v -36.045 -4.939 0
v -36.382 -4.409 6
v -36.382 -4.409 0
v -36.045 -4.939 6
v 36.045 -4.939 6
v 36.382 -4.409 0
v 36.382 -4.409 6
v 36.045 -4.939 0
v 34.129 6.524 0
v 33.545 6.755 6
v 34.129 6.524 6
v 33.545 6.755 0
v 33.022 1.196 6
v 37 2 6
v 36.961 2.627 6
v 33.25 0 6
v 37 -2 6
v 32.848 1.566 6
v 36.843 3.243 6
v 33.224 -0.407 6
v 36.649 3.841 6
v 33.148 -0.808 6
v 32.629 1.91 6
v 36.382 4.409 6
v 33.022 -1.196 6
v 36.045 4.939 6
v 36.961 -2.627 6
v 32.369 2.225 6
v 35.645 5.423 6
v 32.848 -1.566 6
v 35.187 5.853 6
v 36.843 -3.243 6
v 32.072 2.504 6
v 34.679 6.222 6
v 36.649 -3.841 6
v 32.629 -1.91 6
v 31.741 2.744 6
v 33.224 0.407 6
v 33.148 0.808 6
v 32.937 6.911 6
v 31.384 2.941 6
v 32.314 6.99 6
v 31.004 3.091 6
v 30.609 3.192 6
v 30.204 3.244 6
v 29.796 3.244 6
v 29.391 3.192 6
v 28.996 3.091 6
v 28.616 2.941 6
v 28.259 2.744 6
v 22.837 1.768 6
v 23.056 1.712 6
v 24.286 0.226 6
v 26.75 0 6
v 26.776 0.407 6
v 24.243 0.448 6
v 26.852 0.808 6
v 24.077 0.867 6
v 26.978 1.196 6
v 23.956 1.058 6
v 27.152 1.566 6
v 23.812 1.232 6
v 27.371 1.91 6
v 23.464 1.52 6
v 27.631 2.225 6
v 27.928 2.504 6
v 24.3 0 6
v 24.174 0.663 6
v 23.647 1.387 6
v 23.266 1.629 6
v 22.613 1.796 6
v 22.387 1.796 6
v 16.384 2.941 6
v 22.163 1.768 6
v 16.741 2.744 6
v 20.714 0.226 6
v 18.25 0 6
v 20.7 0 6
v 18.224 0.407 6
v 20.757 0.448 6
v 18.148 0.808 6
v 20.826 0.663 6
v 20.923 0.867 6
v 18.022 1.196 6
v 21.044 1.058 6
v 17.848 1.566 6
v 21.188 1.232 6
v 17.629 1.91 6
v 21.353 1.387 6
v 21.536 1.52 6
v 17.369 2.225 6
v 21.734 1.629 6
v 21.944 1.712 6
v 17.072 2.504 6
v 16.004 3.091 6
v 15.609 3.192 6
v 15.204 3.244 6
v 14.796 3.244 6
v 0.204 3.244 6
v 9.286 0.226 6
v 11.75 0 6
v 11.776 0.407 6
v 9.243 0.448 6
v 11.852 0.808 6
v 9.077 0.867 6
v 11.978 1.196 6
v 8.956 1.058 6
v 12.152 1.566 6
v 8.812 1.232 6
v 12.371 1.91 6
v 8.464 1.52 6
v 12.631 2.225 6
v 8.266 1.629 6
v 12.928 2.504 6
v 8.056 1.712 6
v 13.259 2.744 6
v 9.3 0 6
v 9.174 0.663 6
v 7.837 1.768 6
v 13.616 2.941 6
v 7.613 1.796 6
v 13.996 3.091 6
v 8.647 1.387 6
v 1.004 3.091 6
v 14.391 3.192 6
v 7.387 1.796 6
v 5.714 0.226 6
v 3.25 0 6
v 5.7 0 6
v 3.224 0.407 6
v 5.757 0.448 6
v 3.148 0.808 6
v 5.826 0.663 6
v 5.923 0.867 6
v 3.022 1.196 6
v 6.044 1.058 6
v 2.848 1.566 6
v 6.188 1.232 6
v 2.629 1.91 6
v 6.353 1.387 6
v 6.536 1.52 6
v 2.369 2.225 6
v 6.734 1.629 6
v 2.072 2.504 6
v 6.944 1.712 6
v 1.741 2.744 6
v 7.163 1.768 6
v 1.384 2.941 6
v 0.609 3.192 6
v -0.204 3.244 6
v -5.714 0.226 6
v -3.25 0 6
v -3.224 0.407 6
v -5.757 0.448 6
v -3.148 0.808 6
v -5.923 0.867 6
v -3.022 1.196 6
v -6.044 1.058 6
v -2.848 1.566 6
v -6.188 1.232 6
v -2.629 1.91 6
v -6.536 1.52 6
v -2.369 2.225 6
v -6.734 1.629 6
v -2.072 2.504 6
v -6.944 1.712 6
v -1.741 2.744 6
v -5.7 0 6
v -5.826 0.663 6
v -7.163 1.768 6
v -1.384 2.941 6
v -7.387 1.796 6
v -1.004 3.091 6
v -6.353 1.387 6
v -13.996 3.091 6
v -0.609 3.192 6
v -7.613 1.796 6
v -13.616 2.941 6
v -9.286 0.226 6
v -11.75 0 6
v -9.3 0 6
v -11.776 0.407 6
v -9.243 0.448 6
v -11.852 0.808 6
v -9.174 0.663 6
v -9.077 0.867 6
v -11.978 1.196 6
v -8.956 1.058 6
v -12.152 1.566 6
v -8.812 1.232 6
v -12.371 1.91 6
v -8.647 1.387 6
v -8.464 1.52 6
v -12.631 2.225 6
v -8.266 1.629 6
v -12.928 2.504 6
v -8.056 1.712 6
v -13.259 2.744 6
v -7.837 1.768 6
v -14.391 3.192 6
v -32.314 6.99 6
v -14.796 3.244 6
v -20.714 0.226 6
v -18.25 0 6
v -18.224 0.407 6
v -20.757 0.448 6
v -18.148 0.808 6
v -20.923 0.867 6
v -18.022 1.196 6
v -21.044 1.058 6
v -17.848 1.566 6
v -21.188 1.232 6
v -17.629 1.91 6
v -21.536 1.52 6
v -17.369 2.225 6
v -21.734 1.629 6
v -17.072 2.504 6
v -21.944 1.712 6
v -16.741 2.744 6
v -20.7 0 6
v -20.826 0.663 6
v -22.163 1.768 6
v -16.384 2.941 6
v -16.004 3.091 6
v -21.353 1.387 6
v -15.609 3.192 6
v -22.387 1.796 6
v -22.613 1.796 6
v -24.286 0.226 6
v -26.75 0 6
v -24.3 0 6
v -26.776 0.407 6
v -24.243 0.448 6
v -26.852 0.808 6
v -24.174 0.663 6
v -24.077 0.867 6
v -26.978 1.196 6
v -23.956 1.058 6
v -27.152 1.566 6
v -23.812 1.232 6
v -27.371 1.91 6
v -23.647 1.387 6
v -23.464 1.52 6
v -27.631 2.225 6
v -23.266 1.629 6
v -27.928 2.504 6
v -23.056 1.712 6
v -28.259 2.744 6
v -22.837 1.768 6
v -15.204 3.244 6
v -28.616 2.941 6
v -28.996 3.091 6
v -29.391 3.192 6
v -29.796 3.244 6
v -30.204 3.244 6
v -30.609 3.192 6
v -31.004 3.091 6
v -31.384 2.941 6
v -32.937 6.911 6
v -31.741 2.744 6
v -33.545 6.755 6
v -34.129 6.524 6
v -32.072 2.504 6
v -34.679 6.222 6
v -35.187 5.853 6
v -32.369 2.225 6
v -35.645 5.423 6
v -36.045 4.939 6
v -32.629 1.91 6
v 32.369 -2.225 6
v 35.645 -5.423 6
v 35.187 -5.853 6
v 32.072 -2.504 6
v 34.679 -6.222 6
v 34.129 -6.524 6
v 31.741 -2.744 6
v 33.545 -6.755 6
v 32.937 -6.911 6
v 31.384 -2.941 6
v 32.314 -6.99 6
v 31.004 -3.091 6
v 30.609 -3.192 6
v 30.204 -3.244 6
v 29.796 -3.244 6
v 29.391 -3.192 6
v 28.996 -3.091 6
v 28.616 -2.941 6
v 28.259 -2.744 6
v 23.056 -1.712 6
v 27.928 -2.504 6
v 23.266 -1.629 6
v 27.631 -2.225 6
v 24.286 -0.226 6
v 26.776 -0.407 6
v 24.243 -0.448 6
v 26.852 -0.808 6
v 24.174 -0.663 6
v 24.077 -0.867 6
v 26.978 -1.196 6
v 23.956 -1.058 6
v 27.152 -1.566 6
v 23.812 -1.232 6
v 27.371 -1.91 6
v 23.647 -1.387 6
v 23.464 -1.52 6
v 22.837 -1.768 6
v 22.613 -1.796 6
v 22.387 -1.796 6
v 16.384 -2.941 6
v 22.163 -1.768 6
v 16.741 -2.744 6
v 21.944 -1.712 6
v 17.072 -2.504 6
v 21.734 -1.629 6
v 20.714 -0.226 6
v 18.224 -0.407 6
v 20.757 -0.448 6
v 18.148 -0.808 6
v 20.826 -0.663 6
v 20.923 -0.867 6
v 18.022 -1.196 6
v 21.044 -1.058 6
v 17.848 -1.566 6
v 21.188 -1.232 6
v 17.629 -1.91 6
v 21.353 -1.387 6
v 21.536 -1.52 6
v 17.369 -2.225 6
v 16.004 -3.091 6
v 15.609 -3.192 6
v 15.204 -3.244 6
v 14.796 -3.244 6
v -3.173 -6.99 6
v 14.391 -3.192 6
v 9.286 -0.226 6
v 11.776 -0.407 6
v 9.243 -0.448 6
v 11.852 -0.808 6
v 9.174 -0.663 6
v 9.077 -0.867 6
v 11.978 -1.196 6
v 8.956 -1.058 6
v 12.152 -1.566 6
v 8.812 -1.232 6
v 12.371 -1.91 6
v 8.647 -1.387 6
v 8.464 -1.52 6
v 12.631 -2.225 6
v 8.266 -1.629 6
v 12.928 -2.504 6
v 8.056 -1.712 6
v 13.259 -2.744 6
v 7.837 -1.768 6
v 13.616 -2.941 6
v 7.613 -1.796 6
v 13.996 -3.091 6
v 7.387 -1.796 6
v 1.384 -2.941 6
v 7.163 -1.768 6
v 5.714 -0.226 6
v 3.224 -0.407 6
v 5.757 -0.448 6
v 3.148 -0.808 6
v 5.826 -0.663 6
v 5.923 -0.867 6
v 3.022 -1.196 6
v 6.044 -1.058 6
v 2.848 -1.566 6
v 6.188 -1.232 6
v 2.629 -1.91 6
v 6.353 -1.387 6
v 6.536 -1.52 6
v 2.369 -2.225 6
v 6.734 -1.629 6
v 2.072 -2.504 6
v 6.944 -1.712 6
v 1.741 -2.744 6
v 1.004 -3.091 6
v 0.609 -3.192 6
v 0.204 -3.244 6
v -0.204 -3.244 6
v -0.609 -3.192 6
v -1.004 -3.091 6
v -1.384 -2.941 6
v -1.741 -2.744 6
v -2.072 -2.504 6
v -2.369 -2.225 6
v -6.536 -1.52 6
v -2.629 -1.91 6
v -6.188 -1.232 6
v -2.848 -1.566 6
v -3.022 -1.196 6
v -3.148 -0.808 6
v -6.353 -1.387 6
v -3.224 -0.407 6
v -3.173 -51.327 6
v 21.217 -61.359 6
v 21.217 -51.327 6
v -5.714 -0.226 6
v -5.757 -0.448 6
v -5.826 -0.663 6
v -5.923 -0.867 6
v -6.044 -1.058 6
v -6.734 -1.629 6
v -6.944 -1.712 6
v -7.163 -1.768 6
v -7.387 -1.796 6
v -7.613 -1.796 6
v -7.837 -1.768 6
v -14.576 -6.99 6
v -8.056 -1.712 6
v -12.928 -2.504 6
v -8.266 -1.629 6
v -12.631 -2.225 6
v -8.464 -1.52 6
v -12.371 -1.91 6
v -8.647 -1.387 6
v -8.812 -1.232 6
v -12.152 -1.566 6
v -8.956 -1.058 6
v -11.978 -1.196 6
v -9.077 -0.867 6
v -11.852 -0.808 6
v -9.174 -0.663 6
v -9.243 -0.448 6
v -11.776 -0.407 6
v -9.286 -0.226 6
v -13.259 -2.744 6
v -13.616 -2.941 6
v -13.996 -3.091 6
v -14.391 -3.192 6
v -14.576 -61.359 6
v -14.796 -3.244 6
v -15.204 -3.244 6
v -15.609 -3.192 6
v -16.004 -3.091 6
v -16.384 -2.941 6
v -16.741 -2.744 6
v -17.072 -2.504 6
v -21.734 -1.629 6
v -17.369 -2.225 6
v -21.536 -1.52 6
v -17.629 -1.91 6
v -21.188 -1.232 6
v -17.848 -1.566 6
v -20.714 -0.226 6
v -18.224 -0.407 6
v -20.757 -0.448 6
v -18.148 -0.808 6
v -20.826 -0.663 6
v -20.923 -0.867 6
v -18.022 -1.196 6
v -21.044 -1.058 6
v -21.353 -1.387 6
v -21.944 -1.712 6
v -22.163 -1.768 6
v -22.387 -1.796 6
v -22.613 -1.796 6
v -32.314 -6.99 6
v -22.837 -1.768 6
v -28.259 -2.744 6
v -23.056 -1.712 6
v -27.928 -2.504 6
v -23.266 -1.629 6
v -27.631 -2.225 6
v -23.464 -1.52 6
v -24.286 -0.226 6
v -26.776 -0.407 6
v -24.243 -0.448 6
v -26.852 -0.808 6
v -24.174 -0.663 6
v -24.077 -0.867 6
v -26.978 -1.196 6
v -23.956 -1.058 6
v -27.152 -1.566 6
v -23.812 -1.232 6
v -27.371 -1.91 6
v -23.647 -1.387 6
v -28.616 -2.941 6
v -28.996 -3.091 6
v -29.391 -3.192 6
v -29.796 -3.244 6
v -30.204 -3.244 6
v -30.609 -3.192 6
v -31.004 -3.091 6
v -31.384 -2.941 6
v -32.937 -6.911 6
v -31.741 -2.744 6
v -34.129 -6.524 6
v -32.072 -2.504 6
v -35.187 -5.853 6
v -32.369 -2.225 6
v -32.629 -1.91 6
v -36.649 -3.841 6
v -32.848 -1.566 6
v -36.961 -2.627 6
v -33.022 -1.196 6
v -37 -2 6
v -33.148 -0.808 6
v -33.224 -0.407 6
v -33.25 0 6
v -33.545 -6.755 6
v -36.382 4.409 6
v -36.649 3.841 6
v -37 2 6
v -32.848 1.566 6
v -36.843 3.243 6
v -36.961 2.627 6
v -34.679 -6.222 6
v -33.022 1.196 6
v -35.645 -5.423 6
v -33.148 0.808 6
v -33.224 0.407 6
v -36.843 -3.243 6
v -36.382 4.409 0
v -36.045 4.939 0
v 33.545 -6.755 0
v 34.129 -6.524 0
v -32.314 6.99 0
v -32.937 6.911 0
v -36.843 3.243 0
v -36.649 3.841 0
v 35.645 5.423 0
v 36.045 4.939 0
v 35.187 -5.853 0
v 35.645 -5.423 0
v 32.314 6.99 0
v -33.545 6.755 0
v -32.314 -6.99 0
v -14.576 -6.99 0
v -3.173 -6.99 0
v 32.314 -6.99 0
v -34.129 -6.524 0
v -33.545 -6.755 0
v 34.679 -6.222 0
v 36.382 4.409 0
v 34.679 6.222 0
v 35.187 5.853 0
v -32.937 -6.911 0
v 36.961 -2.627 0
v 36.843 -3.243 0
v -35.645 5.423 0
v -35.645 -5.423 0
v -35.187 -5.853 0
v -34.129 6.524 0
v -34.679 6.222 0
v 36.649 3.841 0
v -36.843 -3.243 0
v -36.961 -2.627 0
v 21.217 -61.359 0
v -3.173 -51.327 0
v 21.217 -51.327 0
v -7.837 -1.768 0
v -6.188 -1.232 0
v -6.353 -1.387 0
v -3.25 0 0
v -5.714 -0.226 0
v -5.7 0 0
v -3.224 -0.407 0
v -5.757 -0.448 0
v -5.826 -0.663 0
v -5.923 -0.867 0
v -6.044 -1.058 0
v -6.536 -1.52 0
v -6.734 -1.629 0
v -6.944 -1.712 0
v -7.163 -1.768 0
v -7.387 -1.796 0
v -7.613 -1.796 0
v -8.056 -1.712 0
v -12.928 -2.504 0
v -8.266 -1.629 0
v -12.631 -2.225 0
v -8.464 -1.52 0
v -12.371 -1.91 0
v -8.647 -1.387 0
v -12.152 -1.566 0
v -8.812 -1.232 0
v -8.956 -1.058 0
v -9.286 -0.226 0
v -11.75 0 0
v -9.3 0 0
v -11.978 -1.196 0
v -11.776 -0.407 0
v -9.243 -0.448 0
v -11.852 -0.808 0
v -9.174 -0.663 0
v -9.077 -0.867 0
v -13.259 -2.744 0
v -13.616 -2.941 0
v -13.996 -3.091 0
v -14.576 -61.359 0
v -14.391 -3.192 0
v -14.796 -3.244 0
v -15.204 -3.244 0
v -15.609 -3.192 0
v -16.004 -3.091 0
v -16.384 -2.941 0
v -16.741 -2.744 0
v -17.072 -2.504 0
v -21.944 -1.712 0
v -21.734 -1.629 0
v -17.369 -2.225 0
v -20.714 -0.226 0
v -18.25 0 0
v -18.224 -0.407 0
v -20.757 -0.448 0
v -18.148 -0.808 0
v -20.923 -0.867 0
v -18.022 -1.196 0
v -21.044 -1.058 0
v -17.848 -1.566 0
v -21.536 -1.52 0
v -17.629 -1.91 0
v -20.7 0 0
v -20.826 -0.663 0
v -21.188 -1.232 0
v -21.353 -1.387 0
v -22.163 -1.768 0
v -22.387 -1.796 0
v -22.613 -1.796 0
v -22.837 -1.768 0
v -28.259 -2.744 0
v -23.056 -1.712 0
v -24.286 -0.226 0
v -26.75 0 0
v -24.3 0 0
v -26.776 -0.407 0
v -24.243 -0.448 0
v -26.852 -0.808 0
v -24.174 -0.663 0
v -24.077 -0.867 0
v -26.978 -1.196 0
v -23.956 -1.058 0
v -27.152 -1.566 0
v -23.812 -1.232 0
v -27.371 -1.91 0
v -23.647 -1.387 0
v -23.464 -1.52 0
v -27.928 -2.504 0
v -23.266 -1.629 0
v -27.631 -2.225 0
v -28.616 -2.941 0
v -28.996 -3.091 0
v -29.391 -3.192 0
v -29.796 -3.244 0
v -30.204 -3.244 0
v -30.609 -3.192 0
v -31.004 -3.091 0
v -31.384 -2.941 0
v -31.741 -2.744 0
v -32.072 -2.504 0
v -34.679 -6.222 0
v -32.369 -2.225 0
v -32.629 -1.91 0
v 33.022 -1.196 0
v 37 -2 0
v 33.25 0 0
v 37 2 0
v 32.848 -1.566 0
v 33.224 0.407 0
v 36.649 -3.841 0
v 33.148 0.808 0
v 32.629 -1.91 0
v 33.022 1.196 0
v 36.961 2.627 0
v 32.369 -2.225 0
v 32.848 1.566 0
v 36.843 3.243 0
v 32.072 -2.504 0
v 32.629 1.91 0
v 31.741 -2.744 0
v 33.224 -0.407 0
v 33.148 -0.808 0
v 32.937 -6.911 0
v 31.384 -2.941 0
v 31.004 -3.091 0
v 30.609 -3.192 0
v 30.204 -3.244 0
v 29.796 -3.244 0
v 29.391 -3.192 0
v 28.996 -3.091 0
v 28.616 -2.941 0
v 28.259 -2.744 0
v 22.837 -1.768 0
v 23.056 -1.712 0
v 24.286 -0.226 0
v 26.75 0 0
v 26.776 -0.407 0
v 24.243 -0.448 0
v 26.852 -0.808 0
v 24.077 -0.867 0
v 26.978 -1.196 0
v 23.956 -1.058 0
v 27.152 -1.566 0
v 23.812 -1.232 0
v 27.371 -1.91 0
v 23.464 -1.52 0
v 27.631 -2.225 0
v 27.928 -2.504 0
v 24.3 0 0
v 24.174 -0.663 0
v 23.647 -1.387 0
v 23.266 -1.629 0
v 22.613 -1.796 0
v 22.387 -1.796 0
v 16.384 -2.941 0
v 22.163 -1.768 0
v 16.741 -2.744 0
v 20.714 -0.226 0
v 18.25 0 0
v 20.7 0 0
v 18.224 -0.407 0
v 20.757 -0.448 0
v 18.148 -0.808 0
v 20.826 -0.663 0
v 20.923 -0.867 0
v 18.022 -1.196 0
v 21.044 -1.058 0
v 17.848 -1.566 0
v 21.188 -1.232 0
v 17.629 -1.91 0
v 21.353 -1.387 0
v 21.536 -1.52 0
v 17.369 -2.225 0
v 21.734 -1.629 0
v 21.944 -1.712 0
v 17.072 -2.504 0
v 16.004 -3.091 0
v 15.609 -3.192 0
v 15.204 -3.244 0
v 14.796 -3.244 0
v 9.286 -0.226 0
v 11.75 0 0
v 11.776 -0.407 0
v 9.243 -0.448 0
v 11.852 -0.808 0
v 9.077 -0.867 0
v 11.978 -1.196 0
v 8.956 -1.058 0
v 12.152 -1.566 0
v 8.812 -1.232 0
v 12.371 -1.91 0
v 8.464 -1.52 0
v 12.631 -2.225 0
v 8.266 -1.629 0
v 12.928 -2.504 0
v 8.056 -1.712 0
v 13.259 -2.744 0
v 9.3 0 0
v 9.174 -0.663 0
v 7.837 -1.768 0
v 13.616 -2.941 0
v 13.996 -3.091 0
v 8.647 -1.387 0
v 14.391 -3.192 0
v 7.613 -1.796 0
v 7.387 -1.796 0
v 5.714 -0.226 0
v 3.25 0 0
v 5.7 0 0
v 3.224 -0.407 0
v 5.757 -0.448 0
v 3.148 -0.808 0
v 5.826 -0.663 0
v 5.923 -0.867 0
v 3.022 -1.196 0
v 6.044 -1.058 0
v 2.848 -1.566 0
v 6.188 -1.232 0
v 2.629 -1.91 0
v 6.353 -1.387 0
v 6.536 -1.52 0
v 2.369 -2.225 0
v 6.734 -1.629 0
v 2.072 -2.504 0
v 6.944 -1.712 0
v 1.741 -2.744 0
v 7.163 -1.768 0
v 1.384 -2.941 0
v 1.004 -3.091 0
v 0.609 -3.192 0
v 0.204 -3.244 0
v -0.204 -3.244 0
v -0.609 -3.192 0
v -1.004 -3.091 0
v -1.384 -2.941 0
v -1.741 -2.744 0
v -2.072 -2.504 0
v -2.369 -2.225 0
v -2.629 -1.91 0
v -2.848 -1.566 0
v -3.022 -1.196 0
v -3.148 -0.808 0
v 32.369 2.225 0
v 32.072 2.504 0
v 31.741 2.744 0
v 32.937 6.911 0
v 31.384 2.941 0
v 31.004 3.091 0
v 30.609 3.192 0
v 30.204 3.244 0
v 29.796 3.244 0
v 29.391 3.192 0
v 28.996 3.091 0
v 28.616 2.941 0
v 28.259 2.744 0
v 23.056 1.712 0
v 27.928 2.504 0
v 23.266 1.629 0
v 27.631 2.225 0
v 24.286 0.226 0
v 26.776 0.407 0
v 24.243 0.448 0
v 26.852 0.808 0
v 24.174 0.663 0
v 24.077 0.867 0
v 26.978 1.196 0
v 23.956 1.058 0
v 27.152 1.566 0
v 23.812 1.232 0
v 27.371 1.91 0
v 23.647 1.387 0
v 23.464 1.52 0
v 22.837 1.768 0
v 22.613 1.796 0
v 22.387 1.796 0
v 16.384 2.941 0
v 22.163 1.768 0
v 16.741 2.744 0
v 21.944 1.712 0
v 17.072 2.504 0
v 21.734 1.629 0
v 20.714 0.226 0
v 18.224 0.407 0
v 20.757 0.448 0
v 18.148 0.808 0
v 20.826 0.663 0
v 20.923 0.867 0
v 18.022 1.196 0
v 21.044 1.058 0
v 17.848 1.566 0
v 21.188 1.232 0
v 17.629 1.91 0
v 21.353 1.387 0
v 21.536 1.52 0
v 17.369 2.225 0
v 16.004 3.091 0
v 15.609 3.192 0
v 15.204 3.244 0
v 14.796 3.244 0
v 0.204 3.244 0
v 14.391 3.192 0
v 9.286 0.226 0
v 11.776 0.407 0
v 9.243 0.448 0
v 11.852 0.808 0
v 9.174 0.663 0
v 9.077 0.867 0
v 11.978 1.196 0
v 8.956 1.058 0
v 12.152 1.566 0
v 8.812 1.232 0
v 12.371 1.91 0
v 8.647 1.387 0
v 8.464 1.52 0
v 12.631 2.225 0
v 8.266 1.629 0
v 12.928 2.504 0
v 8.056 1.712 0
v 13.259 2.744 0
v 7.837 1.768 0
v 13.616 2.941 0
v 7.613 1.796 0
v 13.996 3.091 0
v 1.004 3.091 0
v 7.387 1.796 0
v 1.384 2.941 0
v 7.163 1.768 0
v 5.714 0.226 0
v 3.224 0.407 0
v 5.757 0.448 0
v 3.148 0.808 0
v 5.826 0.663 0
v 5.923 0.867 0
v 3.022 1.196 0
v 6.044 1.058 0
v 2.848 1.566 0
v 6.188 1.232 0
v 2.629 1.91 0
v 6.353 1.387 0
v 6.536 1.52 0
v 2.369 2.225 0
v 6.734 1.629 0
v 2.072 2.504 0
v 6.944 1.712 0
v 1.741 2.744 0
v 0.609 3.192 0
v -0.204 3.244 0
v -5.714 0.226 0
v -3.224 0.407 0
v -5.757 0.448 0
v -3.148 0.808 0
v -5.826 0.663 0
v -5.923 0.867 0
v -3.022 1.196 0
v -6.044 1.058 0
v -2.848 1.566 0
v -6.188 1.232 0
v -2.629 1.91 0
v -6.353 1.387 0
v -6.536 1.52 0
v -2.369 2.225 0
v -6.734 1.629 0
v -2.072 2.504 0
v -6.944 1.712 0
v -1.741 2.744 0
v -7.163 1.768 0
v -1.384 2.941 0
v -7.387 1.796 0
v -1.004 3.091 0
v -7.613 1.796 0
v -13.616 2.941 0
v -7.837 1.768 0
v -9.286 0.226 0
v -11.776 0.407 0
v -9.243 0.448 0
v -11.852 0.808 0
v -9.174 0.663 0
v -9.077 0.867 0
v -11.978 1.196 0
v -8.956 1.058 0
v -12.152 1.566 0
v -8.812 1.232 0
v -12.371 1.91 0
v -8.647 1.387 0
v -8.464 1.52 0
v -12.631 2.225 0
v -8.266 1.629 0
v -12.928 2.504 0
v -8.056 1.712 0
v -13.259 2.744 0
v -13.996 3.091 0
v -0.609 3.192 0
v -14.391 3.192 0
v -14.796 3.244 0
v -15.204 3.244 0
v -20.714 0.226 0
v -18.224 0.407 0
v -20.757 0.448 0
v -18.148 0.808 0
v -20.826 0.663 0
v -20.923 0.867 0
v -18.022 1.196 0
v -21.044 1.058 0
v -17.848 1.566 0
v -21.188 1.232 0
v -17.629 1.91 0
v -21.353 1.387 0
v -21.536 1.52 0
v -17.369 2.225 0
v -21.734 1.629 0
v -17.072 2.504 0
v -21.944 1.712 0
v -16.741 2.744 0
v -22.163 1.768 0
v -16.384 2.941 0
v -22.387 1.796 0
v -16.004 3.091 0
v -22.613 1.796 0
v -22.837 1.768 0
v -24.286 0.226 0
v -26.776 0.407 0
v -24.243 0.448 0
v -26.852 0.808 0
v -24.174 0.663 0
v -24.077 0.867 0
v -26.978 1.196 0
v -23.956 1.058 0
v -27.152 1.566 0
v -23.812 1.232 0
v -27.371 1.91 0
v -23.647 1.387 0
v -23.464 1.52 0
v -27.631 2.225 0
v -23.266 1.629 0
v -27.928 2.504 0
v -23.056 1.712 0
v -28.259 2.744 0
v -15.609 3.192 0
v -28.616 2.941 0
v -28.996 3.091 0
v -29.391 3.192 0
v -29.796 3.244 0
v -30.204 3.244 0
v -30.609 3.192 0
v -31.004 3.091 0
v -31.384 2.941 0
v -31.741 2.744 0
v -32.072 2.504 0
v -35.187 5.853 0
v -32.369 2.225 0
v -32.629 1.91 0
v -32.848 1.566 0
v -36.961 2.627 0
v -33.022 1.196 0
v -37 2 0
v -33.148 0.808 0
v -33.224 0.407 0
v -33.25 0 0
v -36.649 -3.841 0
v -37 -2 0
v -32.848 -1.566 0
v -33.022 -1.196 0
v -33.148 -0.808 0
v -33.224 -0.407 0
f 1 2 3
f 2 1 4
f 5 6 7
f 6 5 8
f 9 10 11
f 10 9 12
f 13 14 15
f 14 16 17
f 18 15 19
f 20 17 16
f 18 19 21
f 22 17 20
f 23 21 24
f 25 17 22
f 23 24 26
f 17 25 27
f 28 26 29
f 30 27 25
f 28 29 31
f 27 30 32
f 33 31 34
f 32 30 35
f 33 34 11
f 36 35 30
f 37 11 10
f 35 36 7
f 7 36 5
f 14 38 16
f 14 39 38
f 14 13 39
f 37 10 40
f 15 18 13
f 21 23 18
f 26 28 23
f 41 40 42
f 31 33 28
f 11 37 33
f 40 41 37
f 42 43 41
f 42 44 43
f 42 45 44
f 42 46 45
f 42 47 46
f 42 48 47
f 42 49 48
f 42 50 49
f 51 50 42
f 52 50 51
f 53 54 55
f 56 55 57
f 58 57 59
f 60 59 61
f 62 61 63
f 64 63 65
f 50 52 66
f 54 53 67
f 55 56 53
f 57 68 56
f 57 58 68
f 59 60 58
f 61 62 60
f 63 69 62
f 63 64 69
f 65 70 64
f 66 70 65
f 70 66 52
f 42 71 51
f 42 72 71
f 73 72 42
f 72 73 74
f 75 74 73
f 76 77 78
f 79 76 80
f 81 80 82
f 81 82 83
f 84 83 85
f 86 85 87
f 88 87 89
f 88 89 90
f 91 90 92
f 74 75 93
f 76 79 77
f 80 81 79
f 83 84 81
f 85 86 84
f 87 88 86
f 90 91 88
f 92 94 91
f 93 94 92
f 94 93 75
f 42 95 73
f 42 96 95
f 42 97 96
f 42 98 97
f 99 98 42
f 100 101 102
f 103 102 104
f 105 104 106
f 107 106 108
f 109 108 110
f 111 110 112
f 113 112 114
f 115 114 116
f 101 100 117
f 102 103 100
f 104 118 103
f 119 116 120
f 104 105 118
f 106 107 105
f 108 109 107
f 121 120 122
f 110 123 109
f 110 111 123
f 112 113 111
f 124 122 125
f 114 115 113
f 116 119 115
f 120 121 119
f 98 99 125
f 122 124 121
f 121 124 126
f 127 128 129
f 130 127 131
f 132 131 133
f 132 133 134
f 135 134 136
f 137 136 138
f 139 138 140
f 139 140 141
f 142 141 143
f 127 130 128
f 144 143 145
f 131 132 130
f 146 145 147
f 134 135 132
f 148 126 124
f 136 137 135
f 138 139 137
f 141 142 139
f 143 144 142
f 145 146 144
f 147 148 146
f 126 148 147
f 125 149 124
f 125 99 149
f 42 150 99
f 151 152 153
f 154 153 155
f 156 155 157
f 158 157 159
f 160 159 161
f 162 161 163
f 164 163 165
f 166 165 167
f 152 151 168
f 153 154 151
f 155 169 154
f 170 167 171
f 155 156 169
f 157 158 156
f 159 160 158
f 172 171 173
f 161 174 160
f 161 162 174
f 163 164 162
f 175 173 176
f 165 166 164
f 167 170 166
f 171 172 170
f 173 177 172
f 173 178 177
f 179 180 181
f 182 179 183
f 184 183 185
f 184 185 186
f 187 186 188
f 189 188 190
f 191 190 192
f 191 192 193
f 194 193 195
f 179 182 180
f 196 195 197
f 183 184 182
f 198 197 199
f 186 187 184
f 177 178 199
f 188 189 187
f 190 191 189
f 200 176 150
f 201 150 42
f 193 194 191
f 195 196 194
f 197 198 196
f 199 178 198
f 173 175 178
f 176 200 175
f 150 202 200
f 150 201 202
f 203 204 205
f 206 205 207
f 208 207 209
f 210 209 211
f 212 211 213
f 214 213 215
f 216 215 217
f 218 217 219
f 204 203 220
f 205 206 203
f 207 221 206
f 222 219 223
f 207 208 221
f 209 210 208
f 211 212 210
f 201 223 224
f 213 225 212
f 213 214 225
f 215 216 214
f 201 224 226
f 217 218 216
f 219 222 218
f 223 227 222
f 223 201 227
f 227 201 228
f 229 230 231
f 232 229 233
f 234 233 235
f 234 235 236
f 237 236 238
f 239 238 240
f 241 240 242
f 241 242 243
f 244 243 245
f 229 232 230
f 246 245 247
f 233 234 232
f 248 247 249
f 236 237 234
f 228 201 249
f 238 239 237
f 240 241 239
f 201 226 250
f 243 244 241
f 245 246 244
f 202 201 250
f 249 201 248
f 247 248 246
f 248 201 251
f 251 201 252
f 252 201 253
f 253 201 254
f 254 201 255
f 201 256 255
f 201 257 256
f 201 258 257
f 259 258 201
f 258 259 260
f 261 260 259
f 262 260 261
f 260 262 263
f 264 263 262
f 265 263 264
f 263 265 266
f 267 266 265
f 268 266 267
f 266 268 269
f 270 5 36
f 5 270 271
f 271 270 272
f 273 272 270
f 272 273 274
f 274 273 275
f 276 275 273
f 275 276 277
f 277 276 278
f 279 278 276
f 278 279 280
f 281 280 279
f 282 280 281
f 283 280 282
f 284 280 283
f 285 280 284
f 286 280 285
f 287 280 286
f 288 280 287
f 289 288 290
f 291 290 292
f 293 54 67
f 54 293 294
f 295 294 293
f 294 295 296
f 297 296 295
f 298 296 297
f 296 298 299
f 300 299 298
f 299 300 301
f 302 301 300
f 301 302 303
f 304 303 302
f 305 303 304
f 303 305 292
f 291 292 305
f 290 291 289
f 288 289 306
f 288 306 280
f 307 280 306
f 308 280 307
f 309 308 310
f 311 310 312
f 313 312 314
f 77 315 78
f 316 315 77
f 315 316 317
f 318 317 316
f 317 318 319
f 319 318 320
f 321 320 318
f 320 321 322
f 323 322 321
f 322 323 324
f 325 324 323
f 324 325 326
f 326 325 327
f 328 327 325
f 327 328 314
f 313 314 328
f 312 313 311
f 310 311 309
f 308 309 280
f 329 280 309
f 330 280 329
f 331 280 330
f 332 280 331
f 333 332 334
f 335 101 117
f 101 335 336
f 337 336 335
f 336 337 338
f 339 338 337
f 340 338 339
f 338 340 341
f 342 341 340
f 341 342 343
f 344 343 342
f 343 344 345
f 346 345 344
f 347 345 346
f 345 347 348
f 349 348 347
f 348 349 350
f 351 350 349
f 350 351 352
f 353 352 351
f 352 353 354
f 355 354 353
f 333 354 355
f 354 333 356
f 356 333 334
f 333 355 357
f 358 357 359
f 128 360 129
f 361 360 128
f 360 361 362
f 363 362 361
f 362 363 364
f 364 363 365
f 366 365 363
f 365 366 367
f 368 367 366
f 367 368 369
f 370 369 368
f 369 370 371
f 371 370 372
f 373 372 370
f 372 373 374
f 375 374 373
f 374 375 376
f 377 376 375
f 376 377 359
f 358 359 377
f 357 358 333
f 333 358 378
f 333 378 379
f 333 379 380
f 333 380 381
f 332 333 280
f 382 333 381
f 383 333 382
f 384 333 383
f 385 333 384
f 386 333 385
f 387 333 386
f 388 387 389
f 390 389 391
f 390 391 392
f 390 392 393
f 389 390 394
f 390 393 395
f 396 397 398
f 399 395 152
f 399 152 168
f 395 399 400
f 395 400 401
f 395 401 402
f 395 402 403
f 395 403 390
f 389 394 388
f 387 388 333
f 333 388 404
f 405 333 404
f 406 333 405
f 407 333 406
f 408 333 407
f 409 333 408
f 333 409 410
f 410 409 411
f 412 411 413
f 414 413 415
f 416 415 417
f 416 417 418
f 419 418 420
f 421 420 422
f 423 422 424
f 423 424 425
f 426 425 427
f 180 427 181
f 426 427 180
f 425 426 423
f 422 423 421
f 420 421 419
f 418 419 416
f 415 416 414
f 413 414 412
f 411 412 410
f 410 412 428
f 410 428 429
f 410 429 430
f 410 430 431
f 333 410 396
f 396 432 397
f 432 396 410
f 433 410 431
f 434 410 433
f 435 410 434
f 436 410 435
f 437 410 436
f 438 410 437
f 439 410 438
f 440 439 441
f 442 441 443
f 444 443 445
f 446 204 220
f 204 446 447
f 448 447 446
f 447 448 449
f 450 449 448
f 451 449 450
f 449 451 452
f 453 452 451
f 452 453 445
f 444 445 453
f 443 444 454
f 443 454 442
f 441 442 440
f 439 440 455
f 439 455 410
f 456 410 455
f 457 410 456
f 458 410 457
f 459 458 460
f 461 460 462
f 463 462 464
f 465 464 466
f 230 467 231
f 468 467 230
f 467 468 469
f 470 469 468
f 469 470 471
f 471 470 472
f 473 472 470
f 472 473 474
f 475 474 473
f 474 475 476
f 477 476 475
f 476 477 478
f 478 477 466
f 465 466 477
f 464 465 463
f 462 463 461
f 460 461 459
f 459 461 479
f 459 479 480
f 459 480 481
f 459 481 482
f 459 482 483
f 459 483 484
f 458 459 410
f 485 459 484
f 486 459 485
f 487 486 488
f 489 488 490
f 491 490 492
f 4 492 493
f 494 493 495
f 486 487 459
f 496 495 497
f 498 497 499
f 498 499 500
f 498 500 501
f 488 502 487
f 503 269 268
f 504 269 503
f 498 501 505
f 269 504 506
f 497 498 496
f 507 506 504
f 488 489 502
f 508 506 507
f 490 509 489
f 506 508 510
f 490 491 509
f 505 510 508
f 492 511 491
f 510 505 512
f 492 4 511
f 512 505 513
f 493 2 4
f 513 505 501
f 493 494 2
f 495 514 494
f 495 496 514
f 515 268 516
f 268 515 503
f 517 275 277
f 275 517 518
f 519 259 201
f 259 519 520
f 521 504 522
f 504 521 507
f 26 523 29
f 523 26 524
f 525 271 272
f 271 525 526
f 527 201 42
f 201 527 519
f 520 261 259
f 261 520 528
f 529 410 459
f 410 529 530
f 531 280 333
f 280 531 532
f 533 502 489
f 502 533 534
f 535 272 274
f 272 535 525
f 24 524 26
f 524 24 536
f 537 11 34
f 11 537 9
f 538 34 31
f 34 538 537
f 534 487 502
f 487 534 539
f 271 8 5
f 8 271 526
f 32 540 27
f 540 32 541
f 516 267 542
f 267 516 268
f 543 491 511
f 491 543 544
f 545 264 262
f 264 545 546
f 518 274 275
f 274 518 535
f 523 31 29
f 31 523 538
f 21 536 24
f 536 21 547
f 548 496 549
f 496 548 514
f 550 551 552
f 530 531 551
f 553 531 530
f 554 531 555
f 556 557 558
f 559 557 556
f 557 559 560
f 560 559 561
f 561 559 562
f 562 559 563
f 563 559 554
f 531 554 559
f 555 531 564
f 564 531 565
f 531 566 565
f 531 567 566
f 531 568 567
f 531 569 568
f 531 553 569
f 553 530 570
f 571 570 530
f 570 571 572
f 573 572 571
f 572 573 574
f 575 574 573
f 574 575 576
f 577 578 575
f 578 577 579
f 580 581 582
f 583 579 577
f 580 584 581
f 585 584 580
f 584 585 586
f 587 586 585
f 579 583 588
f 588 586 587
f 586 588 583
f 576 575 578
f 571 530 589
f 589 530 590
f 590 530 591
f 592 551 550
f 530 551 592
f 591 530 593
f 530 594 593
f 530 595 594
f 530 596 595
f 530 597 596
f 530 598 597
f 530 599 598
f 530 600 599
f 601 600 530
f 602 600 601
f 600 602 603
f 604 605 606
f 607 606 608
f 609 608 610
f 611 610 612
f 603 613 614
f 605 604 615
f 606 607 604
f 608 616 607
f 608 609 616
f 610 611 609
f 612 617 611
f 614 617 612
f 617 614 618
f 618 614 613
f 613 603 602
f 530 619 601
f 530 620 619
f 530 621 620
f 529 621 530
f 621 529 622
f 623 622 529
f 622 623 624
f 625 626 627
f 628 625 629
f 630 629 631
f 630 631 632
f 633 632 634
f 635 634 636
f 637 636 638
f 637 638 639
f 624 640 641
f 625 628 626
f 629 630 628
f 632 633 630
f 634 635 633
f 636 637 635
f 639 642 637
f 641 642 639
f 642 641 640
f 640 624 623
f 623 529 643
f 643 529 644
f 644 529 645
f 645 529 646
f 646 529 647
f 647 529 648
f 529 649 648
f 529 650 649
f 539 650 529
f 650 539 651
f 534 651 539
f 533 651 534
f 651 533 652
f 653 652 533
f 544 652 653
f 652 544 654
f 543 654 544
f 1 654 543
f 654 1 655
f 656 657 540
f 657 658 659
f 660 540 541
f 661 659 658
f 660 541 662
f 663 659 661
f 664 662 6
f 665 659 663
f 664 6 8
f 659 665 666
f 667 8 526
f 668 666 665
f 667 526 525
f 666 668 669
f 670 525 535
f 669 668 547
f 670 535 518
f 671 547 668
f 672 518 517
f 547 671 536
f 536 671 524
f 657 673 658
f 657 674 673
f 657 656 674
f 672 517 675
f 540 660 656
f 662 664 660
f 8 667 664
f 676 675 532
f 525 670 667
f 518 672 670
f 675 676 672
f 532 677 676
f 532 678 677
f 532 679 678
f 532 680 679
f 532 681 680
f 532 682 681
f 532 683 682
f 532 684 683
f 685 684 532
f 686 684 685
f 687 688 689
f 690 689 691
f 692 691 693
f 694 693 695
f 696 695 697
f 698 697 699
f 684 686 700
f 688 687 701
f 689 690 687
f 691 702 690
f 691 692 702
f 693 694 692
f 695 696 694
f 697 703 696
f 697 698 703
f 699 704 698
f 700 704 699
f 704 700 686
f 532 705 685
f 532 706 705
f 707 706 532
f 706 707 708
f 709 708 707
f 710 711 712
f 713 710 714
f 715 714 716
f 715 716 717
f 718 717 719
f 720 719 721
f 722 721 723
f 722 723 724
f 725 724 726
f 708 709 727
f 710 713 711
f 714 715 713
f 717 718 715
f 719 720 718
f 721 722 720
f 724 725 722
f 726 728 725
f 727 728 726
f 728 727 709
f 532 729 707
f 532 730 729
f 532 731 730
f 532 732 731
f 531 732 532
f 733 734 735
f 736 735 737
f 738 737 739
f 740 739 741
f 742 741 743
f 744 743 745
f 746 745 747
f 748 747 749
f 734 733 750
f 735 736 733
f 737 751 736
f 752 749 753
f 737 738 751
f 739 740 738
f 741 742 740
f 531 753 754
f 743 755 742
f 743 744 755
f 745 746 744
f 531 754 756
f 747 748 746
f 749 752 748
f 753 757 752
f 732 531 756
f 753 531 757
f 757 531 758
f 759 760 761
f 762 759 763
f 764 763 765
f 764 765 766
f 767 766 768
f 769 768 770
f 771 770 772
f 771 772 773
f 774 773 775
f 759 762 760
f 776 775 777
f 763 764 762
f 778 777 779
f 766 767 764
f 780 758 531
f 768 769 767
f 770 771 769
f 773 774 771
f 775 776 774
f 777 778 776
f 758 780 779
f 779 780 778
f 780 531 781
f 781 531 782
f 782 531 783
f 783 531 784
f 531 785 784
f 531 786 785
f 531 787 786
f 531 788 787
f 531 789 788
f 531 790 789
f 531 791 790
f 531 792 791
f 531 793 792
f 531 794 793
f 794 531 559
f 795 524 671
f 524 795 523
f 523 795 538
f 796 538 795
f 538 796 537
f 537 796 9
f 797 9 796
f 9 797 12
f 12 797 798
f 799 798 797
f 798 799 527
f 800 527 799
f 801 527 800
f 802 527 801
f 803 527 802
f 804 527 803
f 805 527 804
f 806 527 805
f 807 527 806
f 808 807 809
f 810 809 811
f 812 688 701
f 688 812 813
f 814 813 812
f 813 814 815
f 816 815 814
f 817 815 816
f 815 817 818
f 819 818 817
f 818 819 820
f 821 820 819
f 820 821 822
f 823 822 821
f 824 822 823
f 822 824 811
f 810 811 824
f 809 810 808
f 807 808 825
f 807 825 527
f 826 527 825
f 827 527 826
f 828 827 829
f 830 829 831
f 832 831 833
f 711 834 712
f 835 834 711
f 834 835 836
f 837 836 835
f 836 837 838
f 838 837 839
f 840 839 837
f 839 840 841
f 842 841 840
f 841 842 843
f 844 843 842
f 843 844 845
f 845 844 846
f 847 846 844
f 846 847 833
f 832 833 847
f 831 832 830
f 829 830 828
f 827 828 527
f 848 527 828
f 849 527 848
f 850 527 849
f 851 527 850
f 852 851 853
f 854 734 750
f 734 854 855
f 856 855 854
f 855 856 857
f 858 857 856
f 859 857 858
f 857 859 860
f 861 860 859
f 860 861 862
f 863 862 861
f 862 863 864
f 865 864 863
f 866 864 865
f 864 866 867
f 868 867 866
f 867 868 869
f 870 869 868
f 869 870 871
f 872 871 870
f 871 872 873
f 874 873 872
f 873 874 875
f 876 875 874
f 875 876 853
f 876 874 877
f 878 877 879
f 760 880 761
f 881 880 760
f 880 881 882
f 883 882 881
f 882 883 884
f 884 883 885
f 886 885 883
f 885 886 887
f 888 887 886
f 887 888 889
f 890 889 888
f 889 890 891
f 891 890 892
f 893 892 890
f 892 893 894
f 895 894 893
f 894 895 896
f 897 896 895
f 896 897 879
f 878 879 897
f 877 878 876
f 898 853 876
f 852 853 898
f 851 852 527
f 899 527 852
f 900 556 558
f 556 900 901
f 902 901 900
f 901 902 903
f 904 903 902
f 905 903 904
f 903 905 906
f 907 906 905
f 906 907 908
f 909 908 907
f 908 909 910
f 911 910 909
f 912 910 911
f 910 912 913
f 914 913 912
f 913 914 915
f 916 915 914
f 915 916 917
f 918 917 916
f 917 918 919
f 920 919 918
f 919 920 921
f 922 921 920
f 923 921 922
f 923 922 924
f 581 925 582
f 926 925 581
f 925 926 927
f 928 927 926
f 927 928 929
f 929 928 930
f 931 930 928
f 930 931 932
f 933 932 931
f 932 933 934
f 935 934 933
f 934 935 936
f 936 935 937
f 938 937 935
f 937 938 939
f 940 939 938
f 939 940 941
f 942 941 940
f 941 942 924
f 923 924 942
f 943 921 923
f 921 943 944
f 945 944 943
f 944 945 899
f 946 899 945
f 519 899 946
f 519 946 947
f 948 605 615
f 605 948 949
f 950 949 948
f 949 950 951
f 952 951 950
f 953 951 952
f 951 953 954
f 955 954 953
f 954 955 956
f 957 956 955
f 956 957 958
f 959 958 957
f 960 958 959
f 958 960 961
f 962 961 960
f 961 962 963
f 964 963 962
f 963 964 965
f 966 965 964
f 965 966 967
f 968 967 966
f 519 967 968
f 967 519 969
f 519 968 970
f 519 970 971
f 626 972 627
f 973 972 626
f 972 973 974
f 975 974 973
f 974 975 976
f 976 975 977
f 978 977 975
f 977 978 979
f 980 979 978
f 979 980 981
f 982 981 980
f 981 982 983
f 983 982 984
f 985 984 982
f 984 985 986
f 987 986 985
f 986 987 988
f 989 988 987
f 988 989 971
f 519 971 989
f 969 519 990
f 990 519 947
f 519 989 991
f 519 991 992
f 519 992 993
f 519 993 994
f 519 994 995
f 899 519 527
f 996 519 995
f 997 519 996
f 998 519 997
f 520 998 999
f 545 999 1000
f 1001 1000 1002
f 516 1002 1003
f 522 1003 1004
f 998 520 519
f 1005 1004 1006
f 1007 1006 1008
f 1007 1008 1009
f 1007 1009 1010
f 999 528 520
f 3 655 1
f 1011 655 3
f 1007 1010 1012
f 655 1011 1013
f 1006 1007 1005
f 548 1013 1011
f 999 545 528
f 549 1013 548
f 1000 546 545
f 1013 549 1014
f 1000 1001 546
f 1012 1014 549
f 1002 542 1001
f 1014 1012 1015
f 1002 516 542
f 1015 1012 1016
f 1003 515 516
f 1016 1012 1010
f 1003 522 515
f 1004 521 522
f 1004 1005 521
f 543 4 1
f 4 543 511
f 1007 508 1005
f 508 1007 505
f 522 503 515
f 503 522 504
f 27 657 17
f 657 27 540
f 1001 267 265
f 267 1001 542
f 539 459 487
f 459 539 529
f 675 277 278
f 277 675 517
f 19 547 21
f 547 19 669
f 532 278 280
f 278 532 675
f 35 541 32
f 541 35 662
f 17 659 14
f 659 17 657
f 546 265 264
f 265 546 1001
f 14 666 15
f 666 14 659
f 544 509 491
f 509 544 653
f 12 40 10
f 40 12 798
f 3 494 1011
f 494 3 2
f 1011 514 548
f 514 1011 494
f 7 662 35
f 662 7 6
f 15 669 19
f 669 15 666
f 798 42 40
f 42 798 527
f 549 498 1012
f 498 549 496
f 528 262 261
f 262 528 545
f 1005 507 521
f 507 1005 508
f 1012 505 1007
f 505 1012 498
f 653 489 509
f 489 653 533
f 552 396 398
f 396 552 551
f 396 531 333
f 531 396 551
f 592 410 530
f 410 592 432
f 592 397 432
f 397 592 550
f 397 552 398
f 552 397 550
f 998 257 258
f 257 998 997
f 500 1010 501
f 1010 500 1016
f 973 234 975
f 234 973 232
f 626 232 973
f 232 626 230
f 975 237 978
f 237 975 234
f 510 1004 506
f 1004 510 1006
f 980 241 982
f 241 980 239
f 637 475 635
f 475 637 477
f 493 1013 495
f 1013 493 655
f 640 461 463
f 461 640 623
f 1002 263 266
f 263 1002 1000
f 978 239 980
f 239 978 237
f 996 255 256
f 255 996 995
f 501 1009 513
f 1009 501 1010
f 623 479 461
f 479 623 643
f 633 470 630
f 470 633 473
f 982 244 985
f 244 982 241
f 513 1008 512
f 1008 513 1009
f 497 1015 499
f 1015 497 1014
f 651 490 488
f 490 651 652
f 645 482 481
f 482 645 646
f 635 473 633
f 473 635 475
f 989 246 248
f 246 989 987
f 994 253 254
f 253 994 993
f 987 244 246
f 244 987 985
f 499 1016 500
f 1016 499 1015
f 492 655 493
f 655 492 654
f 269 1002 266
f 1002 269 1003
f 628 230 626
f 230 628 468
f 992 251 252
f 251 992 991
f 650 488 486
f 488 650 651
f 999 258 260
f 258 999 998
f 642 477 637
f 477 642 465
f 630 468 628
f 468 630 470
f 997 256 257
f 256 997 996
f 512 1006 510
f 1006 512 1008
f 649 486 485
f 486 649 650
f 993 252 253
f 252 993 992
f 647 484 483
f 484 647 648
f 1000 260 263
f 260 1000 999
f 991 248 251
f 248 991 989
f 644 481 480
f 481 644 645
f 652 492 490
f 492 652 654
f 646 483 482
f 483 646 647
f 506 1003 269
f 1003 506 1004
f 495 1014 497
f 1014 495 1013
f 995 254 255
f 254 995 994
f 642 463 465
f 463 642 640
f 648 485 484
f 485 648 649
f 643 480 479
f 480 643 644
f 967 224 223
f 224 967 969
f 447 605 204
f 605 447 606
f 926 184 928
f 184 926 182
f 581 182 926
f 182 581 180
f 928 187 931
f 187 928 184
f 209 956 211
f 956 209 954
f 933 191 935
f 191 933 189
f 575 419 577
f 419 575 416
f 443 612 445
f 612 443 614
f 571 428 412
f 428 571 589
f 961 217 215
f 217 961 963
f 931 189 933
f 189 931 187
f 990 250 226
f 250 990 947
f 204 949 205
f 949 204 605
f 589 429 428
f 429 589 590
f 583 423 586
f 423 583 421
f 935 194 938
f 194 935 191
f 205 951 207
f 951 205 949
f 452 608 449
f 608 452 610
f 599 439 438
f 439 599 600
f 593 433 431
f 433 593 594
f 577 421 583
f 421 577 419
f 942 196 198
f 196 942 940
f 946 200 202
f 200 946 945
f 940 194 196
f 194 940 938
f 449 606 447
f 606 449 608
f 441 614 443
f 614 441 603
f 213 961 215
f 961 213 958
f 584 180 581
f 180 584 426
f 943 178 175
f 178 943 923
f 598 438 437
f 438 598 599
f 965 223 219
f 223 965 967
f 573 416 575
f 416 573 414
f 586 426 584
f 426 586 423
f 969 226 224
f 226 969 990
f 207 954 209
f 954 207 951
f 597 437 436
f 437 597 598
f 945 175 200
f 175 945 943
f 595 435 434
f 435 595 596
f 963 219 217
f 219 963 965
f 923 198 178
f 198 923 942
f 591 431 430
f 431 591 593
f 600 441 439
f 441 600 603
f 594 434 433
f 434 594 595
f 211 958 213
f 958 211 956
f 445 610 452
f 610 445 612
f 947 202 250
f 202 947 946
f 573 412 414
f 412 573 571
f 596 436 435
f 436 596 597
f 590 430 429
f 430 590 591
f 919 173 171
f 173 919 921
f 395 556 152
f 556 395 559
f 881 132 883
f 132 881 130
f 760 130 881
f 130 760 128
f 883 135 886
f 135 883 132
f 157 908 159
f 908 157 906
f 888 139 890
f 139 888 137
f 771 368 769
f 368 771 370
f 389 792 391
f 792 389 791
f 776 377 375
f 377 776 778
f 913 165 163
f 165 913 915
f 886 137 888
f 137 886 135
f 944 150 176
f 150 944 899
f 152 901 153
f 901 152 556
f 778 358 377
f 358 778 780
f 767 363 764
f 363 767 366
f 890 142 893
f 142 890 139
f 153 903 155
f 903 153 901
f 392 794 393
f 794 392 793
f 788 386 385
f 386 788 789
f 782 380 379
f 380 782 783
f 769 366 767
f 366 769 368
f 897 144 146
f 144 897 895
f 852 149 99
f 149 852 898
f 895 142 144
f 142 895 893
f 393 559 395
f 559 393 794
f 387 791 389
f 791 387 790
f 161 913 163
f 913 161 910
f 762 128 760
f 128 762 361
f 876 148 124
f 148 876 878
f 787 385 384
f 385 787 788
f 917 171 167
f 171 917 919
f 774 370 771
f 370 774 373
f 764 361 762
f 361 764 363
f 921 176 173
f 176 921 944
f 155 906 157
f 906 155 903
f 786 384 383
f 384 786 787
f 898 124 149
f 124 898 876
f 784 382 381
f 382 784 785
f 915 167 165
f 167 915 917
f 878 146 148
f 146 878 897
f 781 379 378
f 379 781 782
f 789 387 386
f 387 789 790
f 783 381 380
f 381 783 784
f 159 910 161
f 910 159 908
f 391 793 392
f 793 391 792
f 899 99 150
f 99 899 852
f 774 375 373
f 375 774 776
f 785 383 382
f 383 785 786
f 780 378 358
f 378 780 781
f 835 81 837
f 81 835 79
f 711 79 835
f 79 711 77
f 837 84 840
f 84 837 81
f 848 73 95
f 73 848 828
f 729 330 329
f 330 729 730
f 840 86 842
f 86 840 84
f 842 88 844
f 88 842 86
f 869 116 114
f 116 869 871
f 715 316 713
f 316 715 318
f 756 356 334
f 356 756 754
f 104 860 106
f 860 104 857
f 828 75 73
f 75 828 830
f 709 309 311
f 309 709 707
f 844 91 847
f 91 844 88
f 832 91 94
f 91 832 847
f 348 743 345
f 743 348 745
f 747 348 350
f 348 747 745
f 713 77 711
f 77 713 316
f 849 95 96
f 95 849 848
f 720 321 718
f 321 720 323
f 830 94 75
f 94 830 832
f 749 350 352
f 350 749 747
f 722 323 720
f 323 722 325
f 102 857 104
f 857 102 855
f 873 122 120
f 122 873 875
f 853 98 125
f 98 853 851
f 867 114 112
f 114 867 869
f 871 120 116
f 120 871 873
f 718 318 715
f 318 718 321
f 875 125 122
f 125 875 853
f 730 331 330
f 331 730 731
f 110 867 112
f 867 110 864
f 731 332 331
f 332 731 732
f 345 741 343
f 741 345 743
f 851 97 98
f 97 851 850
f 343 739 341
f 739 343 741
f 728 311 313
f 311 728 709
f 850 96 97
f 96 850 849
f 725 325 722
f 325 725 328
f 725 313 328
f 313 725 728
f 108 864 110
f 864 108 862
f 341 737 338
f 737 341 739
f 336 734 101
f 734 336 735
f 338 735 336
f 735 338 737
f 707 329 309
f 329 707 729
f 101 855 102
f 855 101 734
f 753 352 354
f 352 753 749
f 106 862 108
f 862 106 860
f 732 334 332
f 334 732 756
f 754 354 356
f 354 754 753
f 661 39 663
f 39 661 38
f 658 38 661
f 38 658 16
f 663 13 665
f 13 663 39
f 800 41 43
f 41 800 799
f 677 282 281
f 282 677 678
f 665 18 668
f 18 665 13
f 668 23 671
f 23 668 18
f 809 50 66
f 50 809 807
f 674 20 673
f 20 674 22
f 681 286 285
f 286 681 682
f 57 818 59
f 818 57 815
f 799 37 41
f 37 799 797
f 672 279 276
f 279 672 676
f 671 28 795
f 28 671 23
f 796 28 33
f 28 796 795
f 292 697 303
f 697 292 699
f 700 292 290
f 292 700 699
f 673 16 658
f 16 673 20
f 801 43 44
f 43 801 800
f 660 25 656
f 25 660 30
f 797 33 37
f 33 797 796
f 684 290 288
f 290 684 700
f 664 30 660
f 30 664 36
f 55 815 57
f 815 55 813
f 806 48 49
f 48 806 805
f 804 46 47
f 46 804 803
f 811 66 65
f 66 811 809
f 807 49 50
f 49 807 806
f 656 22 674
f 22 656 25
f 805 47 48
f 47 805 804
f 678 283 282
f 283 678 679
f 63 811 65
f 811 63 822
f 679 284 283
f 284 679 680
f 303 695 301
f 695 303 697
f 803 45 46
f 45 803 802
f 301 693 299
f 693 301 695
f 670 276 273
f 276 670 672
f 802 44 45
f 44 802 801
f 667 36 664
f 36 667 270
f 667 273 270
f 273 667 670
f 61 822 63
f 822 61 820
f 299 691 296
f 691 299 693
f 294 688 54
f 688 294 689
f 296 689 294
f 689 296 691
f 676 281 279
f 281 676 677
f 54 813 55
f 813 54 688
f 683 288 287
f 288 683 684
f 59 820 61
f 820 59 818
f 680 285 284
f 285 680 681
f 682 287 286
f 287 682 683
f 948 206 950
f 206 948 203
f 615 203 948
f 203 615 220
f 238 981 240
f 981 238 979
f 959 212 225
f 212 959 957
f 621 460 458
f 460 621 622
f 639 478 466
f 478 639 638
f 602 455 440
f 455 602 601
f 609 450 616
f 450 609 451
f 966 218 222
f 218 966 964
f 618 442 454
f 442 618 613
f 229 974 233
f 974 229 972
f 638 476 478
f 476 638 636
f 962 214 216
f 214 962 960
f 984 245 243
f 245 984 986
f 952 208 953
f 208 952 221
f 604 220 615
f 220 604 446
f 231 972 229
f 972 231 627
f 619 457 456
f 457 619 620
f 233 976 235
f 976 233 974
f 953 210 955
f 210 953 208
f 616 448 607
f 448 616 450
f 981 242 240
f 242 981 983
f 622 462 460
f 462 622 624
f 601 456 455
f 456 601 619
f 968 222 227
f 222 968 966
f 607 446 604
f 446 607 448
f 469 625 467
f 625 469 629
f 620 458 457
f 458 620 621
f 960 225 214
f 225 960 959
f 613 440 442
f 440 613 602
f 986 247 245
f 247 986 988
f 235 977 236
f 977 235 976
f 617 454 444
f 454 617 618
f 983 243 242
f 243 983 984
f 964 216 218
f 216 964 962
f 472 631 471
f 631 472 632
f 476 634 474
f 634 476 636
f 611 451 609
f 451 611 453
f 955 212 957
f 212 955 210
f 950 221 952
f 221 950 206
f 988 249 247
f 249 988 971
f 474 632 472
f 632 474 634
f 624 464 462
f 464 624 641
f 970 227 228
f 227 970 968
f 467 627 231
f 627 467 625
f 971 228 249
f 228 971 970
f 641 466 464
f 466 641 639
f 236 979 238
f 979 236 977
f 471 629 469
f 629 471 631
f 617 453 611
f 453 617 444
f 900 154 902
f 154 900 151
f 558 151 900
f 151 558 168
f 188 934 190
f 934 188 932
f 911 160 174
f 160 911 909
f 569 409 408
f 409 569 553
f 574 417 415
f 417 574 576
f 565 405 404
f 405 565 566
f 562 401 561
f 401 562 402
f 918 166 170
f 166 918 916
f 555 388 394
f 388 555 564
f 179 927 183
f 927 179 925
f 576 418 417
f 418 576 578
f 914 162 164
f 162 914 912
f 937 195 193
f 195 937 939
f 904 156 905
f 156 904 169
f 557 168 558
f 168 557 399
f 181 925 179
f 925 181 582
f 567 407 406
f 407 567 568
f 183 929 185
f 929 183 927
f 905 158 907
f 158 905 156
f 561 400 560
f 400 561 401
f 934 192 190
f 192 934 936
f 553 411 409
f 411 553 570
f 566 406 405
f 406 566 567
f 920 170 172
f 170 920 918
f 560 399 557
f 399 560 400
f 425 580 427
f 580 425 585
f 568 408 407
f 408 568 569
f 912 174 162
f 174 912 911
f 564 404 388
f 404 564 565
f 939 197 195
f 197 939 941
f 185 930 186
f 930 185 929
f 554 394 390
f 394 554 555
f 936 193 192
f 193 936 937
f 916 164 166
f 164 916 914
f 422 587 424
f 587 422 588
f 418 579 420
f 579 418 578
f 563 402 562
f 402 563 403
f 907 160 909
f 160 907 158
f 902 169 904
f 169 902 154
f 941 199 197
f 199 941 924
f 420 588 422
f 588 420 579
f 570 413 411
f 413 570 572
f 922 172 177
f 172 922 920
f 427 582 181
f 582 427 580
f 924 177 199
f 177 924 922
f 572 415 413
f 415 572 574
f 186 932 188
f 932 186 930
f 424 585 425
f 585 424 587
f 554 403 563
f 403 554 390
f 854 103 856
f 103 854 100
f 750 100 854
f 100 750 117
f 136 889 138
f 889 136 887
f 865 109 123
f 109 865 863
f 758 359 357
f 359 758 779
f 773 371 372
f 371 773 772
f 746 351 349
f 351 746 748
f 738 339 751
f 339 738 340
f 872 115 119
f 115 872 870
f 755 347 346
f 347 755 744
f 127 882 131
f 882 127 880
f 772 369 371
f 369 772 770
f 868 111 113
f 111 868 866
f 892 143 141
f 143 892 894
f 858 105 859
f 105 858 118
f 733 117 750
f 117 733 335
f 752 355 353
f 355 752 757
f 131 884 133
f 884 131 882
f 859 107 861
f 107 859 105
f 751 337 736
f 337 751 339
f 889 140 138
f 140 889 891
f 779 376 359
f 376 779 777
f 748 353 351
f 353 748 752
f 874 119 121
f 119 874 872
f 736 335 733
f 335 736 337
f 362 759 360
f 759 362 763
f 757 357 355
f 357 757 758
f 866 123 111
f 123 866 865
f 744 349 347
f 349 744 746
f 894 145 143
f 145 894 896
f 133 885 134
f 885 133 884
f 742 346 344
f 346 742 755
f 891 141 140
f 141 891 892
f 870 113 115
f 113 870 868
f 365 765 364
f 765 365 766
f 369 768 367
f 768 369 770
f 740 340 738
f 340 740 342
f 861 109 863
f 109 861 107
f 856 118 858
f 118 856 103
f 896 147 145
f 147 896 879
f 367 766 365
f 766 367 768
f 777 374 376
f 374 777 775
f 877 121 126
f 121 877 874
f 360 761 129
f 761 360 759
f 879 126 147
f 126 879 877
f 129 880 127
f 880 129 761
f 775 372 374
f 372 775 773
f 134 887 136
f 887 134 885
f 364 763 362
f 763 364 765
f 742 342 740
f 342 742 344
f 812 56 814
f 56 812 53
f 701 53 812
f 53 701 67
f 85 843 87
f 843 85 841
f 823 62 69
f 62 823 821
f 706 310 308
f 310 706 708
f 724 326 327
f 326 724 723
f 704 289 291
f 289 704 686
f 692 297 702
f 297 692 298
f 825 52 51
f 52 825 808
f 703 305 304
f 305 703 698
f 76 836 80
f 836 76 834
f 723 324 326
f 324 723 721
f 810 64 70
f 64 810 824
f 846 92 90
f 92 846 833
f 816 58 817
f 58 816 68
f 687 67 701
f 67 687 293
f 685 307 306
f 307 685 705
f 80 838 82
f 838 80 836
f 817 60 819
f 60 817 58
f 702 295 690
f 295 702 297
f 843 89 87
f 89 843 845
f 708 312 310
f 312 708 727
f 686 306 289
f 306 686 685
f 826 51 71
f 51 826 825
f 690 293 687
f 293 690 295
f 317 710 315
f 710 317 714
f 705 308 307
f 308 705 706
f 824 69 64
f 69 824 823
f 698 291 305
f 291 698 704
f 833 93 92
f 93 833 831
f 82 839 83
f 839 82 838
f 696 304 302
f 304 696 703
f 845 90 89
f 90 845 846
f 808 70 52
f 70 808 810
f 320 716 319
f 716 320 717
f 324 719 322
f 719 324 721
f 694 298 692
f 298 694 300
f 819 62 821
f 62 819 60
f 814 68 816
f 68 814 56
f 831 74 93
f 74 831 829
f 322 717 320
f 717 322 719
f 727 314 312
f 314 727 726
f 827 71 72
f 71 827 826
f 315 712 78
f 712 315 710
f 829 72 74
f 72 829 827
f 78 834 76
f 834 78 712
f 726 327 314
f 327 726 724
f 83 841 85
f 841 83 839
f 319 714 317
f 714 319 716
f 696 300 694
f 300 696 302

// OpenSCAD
$fn = 50;


difference() {
	union() {
		hull() {
			translate(v = [-32.0000000000, 2.0000000000, 0]) {
				cylinder(h = 6, r = 5);
			}
			translate(v = [32.0000000000, 2.0000000000, 0]) {
				cylinder(h = 6, r = 5);
			}
			translate(v = [-32.0000000000, -2.0000000000, 0]) {
				cylinder(h = 6, r = 5);
			}
			translate(v = [32.0000000000, -2.0000000000, 0]) {
				cylinder(h = 6, r = 5);
			}
		}
		translate(v = [0, -5, 0]) {
			linear_extrude(height = 6) {
				text(font = "DejaVu Sans Mono:style=Bold", halign = "center", size = 57.0000000000, text = "L", valign = "top");
			}
		}
	}
	union() {
		translate(v = [-30.0000000000, 0.0000000000, 0]) {
			translate(v = [0, 0, -100]) {
				cylinder(h = 200, r = 3.2500000000);
			}
		}
		translate(v = [-15.0000000000, 0.0000000000, 0]) {
			translate(v = [0, 0, -100]) {
				cylinder(h = 200, r = 3.2500000000);
			}
		}
		translate(v = [0, 0, -100]) {
			cylinder(h = 200, r = 3.2500000000);
		}
		translate(v = [15.0000000000, 0.0000000000, 0]) {
			translate(v = [0, 0, -100]) {
				cylinder(h = 200, r = 3.2500000000);
			}
		}
		translate(v = [30.0000000000, 0.0000000000, 0]) {
			translate(v = [0, 0, -100]) {
				cylinder(h = 200, r = 3.2500000000);
			}
		}
		translate(v = [-30.0000000000, 0.0000000000, 0]) {
			translate(v = [0, 0, -100]) {
				cylinder(h = 200, r = 1.8000000000);
			}
		}
		translate(v = [-22.5000000000, 0.0000000000, 0]) {
			translate(v = [0, 0, -100]) {
				cylinder(h = 200, r = 1.8000000000);
			}
		}
		translate(v = [-15.0000000000, 0.0000000000, 0]) {
			translate(v = [0, 0, -100]) {
				cylinder(h = 200, r = 1.8000000000);
			}
		}
		translate(v = [-7.5000000000, 0.0000000000, 0]) {
			translate(v = [0, 0, -100]) {
				cylinder(h = 200, r = 1.8000000000);
			}
		}
		translate(v = [0, 0, -100]) {
			cylinder(h = 200, r = 1.8000000000);
		}
		translate(v = [7.5000000000, 0.0000000000, 0]) {
			translate(v = [0, 0, -100]) {
				cylinder(h = 200, r = 1.8000000000);
			}
		}
		translate(v = [15.0000000000, 0.0000000000, 0]) {
			translate(v = [0, 0, -100]) {
				cylinder(h = 200, r = 1.8000000000);
			}
		}
		translate(v = [22.5000000000, 0.0000000000, 0]) {
			translate(v = [0, 0, -100]) {
				cylinder(h = 200, r = 1.8000000000);
			}
		}
		translate(v = [30.0000000000, 0.0000000000, 0]) {
			translate(v = [0, 0, -100]) {
				cylinder(h = 200, r = 1.8000000000);
			}
		}
	}
}
